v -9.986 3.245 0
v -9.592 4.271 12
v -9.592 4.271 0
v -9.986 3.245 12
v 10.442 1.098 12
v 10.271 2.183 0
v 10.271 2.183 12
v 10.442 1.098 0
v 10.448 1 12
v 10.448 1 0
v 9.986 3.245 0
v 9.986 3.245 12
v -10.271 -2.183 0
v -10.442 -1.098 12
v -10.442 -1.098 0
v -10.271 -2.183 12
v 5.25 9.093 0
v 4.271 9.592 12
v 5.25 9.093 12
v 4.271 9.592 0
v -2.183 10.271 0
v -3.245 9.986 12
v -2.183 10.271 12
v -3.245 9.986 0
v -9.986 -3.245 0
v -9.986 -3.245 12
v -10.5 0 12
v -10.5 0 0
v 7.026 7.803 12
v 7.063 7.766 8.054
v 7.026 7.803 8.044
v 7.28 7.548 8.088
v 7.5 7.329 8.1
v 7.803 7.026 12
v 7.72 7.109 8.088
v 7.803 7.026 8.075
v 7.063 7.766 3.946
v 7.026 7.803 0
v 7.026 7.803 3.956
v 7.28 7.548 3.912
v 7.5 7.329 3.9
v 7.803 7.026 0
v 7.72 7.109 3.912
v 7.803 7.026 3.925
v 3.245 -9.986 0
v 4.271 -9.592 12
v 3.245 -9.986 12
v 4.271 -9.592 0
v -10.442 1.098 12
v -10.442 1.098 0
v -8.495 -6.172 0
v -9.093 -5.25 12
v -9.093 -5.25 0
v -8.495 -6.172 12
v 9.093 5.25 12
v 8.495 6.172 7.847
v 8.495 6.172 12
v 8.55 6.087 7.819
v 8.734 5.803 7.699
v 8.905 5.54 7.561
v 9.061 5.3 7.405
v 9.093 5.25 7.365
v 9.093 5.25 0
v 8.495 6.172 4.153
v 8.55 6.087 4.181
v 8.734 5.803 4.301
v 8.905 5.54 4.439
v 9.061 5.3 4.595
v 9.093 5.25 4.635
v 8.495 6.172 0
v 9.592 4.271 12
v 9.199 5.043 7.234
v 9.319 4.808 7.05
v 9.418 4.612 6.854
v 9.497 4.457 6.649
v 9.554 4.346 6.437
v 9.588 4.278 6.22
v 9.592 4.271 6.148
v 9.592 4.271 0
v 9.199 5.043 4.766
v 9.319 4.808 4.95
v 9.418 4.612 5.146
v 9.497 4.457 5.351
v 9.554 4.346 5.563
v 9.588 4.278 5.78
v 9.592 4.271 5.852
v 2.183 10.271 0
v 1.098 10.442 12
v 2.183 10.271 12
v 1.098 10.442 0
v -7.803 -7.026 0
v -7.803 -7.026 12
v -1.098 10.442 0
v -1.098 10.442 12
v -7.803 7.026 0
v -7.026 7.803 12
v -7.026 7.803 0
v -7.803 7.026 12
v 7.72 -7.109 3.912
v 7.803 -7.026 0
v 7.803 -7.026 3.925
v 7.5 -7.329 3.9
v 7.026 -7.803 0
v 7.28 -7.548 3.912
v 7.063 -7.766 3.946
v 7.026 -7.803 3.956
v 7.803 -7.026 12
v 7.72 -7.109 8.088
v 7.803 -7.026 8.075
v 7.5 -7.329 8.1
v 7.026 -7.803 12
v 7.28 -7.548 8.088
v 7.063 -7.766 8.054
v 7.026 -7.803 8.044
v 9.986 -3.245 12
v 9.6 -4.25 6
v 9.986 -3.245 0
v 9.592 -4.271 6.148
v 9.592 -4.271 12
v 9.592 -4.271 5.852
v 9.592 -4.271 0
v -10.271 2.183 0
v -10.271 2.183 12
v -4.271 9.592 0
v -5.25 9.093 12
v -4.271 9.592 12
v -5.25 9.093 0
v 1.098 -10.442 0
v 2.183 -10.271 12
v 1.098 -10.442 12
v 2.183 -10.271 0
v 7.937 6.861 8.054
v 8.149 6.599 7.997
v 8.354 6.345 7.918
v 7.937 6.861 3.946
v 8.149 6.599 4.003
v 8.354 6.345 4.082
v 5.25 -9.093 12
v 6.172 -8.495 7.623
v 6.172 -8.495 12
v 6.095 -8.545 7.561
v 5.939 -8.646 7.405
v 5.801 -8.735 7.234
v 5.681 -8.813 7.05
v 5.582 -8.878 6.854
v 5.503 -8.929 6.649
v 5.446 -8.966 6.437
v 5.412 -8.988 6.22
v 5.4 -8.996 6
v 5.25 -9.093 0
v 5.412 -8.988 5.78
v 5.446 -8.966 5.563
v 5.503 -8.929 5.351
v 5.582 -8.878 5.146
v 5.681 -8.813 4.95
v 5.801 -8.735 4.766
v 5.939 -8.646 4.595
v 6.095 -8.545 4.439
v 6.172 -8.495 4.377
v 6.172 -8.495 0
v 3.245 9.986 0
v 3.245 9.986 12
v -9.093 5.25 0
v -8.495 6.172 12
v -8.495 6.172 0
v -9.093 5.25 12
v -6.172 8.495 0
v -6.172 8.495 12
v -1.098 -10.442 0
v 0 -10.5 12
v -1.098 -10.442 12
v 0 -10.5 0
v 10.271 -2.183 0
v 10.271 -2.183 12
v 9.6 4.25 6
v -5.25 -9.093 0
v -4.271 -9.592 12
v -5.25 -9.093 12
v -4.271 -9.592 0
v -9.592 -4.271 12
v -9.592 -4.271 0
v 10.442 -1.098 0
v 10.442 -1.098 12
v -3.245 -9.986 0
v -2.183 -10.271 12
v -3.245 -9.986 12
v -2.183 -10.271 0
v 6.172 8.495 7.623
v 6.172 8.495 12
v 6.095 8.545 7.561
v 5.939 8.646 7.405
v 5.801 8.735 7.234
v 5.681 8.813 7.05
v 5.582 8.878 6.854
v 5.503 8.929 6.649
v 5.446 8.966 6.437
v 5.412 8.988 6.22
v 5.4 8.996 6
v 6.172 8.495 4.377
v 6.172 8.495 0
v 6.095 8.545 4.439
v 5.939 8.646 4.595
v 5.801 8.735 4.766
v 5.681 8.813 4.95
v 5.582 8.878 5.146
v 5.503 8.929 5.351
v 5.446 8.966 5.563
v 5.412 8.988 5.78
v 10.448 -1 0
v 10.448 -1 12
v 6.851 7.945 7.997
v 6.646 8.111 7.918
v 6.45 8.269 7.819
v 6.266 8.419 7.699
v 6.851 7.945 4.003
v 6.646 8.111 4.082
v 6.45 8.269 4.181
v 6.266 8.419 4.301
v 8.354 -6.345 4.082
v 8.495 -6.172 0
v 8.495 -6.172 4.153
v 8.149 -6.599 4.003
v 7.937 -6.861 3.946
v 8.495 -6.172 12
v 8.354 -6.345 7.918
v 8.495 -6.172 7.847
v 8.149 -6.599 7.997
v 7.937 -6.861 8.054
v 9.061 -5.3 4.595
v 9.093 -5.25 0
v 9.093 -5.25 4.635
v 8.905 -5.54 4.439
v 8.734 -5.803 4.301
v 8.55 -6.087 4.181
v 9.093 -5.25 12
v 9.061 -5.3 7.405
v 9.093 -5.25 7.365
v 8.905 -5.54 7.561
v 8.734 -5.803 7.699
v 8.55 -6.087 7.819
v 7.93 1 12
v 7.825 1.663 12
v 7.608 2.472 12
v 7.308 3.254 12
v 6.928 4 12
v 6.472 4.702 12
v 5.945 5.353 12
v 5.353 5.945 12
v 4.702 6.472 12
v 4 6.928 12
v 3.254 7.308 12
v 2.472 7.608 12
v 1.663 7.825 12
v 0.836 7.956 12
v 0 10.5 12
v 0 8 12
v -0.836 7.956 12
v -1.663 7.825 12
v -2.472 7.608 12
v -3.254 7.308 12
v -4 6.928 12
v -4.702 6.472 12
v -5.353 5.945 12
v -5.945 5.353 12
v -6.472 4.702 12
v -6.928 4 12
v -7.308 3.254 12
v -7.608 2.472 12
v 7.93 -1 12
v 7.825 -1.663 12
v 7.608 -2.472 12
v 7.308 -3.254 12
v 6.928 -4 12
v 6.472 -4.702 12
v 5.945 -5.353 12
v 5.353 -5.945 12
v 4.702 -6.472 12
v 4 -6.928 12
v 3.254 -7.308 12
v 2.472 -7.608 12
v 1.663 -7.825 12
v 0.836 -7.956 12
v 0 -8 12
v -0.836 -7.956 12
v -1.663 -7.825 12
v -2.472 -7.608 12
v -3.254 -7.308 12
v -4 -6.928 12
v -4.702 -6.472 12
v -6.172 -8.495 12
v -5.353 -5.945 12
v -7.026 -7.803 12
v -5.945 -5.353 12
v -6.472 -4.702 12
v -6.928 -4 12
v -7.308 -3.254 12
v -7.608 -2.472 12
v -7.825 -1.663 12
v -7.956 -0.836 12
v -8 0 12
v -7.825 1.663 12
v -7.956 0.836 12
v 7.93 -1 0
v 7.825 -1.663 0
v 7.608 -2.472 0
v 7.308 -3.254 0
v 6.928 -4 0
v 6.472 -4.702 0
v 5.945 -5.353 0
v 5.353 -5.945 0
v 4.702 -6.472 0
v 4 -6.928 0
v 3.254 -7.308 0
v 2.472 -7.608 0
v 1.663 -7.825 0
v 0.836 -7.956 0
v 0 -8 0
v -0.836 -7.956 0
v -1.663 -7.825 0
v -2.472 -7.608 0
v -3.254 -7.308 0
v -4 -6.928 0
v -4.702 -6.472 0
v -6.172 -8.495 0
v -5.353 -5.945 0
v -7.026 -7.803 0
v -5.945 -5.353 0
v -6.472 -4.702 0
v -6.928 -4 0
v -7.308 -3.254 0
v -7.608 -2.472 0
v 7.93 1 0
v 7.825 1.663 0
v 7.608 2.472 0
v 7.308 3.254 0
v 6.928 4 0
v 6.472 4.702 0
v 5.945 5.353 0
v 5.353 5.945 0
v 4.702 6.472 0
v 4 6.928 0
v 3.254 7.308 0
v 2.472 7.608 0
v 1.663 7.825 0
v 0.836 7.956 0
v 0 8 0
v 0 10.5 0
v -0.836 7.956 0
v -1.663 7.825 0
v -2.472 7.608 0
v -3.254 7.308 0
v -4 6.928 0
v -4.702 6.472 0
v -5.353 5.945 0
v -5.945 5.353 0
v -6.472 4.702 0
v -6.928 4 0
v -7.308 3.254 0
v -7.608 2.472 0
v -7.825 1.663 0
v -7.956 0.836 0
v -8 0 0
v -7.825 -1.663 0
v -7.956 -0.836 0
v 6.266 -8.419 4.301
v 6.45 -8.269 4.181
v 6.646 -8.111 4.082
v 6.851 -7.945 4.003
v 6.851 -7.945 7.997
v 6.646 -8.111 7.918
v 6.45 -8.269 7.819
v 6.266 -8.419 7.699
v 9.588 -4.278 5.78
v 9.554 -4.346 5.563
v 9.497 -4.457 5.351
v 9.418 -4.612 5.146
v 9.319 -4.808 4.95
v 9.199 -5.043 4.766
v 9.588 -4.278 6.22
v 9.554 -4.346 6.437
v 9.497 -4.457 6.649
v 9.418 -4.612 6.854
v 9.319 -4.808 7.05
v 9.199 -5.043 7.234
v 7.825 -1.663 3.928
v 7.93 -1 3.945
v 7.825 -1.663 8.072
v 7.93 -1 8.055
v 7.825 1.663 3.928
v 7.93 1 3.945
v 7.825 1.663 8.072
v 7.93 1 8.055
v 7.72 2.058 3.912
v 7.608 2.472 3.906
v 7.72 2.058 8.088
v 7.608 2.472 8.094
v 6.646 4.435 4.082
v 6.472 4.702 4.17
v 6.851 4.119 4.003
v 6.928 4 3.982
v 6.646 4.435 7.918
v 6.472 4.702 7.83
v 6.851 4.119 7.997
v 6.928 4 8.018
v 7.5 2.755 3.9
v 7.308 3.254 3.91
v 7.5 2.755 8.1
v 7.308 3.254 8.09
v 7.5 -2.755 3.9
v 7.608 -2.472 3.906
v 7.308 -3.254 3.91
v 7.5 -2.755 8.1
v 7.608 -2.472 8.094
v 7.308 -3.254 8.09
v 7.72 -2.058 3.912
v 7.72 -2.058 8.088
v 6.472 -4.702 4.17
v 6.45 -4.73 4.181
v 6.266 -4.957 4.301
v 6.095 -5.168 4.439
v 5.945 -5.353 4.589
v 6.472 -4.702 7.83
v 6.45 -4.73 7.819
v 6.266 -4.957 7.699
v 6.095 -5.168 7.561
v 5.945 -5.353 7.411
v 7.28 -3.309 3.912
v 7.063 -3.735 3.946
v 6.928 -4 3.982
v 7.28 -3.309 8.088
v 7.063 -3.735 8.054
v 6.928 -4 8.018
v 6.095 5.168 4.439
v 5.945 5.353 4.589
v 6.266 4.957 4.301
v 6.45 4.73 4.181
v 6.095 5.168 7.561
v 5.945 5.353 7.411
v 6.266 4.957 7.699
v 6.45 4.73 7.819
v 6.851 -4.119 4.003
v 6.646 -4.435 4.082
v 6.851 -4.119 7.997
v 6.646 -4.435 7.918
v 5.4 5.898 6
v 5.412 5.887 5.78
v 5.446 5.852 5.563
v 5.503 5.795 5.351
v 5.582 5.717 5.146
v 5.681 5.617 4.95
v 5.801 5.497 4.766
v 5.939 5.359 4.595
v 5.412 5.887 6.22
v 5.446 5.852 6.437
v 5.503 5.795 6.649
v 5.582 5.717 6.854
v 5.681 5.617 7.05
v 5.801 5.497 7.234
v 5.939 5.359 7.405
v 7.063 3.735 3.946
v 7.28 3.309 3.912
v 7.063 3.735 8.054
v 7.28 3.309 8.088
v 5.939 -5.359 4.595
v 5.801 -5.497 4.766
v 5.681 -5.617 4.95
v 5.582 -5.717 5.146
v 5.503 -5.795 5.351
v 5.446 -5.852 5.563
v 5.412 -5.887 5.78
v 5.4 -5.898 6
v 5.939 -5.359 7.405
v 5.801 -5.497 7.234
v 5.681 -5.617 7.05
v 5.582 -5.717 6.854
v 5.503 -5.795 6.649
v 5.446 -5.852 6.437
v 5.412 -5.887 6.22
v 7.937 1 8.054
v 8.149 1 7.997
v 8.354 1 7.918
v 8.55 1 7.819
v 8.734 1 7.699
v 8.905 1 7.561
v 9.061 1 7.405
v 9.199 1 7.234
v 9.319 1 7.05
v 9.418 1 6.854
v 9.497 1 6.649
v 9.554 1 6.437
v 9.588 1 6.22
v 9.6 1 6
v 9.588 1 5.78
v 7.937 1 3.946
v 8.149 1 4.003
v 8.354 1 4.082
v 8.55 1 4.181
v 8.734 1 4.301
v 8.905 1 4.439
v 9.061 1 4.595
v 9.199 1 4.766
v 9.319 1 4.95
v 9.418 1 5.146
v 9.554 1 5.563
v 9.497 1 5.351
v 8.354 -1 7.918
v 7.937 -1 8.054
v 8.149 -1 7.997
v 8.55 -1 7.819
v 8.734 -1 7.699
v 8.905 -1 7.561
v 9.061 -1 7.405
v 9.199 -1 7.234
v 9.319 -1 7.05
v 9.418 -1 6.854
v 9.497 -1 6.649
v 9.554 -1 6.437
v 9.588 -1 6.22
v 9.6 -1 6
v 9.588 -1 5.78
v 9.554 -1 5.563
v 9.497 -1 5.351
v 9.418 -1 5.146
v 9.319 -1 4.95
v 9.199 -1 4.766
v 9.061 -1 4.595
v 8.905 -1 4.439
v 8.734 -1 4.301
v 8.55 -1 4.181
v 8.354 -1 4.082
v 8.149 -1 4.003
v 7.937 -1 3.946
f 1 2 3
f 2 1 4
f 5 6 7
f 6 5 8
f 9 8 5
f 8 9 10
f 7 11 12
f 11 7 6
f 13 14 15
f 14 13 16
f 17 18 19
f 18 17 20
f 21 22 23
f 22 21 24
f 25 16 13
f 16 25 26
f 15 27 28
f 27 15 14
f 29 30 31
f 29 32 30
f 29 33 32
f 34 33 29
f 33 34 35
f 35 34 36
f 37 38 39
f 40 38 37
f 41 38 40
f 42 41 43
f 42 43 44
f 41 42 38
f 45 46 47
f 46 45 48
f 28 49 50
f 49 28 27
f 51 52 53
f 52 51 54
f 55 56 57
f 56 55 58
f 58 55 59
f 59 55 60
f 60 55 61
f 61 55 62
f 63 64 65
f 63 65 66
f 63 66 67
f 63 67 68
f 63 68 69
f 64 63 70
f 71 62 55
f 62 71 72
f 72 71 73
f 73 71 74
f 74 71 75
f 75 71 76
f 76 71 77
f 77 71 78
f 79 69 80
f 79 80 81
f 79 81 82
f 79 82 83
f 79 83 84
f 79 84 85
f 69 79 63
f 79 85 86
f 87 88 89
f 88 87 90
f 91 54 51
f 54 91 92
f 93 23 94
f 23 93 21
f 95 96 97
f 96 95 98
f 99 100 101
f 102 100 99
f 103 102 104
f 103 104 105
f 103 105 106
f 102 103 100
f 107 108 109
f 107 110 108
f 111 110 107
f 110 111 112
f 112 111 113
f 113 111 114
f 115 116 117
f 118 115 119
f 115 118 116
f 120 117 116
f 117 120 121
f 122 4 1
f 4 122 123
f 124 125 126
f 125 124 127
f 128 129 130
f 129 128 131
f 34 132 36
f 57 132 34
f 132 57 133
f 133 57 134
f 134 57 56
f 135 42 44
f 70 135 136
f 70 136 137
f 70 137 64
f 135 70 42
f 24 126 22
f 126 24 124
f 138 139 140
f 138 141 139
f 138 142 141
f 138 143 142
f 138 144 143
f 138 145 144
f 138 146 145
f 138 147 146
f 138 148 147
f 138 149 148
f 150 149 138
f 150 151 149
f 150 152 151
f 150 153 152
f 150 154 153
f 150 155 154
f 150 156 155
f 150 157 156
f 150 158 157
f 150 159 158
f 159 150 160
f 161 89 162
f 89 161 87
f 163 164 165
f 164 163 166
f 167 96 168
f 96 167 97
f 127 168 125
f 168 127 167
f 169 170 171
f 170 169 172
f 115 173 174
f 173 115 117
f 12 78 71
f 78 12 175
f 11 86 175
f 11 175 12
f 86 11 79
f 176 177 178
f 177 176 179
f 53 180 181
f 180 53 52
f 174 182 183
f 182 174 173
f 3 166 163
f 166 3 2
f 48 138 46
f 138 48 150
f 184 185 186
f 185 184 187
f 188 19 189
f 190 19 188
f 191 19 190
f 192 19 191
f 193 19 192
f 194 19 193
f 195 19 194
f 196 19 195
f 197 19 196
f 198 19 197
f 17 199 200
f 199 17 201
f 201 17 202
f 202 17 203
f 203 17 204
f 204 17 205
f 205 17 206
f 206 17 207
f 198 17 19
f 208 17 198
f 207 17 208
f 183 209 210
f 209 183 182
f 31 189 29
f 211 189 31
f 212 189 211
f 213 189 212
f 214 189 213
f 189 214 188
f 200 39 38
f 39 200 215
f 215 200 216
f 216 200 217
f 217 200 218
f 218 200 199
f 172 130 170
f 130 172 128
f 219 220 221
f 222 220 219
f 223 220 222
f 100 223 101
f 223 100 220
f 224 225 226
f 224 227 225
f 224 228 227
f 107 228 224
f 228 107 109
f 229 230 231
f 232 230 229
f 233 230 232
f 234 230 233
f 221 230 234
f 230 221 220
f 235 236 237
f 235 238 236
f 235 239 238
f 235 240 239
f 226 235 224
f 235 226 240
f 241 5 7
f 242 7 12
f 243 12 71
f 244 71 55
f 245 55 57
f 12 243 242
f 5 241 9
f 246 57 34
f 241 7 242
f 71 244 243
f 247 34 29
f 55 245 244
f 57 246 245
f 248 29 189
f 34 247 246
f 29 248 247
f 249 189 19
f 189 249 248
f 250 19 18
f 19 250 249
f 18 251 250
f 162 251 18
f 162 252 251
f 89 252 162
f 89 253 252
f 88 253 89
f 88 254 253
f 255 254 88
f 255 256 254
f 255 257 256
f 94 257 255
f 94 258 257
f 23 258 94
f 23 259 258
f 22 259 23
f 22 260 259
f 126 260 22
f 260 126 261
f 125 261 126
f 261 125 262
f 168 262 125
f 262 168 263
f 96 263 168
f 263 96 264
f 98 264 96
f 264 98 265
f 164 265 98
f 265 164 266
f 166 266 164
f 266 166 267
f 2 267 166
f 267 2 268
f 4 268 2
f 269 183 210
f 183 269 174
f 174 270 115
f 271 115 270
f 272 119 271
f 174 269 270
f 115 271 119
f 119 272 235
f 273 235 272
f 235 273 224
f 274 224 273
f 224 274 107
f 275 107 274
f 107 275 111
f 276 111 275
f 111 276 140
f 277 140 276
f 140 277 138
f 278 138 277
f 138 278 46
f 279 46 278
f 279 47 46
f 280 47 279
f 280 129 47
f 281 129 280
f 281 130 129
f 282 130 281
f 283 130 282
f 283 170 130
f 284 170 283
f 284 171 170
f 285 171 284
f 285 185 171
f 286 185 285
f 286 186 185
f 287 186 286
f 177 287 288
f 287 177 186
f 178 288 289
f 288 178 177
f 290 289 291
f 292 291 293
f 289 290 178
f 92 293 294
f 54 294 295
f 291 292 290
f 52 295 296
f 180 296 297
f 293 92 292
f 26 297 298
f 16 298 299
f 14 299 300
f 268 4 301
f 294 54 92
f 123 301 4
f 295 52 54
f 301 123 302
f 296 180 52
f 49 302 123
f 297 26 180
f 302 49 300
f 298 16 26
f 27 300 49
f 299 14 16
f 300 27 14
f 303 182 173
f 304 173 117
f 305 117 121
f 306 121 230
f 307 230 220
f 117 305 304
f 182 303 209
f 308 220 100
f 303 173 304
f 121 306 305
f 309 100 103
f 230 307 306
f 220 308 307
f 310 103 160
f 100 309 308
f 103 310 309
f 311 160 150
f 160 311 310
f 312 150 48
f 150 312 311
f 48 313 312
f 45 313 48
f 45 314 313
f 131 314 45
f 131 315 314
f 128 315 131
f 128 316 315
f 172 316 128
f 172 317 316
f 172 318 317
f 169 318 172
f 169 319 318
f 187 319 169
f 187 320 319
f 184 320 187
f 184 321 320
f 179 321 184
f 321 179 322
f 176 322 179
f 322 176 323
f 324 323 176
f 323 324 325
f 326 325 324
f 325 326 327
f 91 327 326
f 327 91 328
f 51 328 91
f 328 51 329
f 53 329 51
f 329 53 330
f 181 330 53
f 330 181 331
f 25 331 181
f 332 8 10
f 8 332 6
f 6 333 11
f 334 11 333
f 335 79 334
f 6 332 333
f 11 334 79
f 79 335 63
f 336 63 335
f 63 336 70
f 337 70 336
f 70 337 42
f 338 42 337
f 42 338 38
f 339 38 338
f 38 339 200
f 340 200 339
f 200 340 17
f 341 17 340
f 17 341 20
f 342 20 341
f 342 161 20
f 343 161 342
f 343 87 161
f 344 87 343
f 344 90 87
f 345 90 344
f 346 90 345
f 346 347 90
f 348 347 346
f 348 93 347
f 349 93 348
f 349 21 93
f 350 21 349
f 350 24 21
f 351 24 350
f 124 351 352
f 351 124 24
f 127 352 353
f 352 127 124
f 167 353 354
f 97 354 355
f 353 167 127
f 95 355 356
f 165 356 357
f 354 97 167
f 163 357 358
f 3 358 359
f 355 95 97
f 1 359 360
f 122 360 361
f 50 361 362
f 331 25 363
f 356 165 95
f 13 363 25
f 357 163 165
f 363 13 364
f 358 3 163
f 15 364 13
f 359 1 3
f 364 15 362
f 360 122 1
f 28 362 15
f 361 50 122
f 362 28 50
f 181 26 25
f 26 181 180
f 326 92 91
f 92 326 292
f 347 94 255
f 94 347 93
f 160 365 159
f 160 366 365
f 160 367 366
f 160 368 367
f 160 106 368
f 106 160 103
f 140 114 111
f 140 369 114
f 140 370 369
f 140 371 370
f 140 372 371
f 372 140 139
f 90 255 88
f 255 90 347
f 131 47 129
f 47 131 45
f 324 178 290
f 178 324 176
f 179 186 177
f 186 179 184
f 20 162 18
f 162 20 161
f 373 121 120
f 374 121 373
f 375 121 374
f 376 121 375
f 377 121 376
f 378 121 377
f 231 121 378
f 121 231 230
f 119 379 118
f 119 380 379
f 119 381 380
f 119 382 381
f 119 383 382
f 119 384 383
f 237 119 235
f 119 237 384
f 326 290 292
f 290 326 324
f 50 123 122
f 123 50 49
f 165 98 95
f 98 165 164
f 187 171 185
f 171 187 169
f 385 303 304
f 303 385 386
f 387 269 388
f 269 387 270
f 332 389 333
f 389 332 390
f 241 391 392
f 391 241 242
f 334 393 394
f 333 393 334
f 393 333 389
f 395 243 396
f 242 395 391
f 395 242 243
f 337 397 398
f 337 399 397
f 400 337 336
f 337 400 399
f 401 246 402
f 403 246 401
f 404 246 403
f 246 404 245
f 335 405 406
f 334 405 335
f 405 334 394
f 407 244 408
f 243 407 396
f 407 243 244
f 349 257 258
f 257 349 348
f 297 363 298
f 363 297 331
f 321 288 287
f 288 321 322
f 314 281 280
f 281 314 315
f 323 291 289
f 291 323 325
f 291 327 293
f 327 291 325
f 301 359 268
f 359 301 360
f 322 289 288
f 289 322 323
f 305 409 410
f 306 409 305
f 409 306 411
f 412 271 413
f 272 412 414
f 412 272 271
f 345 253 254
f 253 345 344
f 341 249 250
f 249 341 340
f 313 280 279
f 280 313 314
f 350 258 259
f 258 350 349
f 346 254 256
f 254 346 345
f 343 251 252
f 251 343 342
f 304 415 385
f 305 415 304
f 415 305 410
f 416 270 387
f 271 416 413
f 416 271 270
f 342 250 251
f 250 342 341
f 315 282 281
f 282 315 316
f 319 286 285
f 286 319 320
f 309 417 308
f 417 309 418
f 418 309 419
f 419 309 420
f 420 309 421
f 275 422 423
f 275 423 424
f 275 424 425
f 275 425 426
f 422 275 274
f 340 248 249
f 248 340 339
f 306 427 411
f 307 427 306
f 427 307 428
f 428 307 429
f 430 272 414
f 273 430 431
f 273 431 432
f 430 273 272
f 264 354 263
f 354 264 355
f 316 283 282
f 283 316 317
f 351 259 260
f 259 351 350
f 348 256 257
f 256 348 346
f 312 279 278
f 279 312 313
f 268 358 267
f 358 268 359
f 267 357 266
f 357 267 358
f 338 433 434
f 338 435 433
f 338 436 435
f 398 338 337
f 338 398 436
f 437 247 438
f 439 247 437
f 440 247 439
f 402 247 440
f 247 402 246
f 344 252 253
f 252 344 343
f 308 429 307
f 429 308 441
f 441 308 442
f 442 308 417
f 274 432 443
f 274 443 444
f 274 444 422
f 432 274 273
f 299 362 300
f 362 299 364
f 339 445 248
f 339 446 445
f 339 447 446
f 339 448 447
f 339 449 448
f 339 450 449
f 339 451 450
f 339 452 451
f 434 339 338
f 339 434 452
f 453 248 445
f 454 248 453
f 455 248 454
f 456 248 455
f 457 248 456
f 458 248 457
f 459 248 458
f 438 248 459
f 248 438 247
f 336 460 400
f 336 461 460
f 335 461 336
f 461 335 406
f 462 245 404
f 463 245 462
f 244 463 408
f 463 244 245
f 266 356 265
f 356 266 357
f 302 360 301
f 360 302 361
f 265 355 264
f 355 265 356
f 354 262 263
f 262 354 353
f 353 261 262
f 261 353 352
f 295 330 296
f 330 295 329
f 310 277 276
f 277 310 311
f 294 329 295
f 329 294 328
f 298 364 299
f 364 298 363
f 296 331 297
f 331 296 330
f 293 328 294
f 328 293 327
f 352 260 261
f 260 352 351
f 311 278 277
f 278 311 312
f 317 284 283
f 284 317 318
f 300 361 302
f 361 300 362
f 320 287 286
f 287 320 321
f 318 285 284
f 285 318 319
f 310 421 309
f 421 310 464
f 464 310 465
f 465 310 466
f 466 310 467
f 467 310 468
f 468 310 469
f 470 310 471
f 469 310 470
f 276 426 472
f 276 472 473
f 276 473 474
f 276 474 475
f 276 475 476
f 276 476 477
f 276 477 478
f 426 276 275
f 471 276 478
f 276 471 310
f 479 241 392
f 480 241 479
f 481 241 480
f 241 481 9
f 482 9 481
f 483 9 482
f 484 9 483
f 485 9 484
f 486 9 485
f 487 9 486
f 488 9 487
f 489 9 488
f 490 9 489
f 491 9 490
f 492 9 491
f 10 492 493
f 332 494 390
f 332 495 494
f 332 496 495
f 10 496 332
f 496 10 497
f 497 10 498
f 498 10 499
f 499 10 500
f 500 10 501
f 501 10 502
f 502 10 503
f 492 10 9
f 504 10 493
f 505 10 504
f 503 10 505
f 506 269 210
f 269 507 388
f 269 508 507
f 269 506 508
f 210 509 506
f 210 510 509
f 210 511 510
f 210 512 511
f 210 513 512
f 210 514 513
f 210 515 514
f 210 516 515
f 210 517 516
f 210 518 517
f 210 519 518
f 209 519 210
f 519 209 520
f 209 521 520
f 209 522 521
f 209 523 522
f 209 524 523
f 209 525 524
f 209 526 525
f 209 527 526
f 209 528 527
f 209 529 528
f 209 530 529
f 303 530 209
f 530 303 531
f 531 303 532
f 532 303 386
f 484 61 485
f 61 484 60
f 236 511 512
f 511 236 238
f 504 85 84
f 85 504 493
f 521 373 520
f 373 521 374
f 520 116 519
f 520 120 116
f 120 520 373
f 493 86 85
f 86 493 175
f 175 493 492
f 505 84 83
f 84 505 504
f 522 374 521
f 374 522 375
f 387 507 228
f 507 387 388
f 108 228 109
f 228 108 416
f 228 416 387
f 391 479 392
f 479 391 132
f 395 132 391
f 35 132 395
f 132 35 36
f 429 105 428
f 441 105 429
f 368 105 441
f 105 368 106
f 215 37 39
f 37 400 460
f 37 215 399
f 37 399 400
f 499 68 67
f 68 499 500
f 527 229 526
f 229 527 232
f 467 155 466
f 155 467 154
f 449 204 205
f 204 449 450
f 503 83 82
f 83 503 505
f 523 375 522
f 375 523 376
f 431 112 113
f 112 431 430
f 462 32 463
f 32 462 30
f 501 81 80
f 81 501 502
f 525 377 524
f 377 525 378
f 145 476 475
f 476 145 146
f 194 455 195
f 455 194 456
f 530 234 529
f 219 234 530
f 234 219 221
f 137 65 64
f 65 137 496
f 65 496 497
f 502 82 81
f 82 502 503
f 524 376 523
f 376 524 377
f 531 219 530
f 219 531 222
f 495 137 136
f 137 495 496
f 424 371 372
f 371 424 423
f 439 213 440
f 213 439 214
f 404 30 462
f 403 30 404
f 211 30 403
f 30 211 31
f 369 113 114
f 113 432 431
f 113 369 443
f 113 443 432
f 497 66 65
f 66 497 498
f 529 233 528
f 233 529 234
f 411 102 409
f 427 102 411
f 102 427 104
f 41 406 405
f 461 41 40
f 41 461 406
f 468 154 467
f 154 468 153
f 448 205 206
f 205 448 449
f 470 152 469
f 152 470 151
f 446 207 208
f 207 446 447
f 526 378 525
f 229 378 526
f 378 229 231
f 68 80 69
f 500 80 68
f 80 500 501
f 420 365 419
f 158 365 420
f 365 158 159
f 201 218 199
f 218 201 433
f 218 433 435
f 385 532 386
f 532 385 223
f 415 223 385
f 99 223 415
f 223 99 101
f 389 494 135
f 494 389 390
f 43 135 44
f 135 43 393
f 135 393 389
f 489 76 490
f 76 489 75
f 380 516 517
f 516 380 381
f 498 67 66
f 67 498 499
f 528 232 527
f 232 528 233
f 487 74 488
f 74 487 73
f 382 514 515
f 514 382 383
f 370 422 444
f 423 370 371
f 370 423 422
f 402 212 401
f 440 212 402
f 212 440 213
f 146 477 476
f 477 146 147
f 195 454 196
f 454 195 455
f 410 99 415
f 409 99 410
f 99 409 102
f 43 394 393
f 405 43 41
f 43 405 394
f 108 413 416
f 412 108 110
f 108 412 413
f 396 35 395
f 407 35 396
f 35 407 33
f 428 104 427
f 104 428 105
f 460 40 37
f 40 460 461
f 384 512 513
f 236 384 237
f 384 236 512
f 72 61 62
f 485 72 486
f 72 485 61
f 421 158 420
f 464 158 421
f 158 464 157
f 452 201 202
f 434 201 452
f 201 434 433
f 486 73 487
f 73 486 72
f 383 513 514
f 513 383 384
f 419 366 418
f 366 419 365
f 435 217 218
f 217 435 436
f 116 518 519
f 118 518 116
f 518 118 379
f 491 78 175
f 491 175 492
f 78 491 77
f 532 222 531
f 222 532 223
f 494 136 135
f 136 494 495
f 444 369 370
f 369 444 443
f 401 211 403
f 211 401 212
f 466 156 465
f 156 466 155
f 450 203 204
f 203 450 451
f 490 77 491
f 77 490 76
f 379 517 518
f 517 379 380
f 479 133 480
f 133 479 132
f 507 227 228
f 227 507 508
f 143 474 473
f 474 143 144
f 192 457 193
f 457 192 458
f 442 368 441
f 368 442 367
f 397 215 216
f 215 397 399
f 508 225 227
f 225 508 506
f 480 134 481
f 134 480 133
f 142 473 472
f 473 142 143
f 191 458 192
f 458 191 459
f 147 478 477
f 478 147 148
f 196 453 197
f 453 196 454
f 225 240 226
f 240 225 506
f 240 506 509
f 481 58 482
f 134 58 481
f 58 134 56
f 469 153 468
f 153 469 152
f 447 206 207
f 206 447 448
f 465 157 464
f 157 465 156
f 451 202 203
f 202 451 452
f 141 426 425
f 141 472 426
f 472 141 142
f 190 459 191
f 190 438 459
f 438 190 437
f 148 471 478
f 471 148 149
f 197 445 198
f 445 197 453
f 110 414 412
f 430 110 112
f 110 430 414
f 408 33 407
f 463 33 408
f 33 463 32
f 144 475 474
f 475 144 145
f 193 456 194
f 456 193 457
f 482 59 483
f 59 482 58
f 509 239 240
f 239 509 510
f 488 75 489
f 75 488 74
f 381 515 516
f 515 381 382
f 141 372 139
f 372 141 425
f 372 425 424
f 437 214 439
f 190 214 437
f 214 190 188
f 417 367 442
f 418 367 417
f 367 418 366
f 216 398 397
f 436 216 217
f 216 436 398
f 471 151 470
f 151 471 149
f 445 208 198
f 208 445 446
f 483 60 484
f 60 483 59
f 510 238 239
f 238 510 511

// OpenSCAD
// C-style pipe clamp.
$fn = 60;
eps = 0.02;
pipe_d = 16;
wall = 2.5;
outer_d = pipe_d+2*wall;
width = 12;
difference() {
    cylinder(d=outer_d,h=width);
    translate([0,0,-eps]) cylinder(d=pipe_d,h=width+2*eps);
    translate([0,-1,-eps]) cube([outer_d/2+eps,2,width+2*eps]);
    translate([outer_d/2-3,-outer_d/2-eps,width/2]) rotate([-90,0,0]) cylinder(d=4.2,h=outer_d+2*eps);
}
